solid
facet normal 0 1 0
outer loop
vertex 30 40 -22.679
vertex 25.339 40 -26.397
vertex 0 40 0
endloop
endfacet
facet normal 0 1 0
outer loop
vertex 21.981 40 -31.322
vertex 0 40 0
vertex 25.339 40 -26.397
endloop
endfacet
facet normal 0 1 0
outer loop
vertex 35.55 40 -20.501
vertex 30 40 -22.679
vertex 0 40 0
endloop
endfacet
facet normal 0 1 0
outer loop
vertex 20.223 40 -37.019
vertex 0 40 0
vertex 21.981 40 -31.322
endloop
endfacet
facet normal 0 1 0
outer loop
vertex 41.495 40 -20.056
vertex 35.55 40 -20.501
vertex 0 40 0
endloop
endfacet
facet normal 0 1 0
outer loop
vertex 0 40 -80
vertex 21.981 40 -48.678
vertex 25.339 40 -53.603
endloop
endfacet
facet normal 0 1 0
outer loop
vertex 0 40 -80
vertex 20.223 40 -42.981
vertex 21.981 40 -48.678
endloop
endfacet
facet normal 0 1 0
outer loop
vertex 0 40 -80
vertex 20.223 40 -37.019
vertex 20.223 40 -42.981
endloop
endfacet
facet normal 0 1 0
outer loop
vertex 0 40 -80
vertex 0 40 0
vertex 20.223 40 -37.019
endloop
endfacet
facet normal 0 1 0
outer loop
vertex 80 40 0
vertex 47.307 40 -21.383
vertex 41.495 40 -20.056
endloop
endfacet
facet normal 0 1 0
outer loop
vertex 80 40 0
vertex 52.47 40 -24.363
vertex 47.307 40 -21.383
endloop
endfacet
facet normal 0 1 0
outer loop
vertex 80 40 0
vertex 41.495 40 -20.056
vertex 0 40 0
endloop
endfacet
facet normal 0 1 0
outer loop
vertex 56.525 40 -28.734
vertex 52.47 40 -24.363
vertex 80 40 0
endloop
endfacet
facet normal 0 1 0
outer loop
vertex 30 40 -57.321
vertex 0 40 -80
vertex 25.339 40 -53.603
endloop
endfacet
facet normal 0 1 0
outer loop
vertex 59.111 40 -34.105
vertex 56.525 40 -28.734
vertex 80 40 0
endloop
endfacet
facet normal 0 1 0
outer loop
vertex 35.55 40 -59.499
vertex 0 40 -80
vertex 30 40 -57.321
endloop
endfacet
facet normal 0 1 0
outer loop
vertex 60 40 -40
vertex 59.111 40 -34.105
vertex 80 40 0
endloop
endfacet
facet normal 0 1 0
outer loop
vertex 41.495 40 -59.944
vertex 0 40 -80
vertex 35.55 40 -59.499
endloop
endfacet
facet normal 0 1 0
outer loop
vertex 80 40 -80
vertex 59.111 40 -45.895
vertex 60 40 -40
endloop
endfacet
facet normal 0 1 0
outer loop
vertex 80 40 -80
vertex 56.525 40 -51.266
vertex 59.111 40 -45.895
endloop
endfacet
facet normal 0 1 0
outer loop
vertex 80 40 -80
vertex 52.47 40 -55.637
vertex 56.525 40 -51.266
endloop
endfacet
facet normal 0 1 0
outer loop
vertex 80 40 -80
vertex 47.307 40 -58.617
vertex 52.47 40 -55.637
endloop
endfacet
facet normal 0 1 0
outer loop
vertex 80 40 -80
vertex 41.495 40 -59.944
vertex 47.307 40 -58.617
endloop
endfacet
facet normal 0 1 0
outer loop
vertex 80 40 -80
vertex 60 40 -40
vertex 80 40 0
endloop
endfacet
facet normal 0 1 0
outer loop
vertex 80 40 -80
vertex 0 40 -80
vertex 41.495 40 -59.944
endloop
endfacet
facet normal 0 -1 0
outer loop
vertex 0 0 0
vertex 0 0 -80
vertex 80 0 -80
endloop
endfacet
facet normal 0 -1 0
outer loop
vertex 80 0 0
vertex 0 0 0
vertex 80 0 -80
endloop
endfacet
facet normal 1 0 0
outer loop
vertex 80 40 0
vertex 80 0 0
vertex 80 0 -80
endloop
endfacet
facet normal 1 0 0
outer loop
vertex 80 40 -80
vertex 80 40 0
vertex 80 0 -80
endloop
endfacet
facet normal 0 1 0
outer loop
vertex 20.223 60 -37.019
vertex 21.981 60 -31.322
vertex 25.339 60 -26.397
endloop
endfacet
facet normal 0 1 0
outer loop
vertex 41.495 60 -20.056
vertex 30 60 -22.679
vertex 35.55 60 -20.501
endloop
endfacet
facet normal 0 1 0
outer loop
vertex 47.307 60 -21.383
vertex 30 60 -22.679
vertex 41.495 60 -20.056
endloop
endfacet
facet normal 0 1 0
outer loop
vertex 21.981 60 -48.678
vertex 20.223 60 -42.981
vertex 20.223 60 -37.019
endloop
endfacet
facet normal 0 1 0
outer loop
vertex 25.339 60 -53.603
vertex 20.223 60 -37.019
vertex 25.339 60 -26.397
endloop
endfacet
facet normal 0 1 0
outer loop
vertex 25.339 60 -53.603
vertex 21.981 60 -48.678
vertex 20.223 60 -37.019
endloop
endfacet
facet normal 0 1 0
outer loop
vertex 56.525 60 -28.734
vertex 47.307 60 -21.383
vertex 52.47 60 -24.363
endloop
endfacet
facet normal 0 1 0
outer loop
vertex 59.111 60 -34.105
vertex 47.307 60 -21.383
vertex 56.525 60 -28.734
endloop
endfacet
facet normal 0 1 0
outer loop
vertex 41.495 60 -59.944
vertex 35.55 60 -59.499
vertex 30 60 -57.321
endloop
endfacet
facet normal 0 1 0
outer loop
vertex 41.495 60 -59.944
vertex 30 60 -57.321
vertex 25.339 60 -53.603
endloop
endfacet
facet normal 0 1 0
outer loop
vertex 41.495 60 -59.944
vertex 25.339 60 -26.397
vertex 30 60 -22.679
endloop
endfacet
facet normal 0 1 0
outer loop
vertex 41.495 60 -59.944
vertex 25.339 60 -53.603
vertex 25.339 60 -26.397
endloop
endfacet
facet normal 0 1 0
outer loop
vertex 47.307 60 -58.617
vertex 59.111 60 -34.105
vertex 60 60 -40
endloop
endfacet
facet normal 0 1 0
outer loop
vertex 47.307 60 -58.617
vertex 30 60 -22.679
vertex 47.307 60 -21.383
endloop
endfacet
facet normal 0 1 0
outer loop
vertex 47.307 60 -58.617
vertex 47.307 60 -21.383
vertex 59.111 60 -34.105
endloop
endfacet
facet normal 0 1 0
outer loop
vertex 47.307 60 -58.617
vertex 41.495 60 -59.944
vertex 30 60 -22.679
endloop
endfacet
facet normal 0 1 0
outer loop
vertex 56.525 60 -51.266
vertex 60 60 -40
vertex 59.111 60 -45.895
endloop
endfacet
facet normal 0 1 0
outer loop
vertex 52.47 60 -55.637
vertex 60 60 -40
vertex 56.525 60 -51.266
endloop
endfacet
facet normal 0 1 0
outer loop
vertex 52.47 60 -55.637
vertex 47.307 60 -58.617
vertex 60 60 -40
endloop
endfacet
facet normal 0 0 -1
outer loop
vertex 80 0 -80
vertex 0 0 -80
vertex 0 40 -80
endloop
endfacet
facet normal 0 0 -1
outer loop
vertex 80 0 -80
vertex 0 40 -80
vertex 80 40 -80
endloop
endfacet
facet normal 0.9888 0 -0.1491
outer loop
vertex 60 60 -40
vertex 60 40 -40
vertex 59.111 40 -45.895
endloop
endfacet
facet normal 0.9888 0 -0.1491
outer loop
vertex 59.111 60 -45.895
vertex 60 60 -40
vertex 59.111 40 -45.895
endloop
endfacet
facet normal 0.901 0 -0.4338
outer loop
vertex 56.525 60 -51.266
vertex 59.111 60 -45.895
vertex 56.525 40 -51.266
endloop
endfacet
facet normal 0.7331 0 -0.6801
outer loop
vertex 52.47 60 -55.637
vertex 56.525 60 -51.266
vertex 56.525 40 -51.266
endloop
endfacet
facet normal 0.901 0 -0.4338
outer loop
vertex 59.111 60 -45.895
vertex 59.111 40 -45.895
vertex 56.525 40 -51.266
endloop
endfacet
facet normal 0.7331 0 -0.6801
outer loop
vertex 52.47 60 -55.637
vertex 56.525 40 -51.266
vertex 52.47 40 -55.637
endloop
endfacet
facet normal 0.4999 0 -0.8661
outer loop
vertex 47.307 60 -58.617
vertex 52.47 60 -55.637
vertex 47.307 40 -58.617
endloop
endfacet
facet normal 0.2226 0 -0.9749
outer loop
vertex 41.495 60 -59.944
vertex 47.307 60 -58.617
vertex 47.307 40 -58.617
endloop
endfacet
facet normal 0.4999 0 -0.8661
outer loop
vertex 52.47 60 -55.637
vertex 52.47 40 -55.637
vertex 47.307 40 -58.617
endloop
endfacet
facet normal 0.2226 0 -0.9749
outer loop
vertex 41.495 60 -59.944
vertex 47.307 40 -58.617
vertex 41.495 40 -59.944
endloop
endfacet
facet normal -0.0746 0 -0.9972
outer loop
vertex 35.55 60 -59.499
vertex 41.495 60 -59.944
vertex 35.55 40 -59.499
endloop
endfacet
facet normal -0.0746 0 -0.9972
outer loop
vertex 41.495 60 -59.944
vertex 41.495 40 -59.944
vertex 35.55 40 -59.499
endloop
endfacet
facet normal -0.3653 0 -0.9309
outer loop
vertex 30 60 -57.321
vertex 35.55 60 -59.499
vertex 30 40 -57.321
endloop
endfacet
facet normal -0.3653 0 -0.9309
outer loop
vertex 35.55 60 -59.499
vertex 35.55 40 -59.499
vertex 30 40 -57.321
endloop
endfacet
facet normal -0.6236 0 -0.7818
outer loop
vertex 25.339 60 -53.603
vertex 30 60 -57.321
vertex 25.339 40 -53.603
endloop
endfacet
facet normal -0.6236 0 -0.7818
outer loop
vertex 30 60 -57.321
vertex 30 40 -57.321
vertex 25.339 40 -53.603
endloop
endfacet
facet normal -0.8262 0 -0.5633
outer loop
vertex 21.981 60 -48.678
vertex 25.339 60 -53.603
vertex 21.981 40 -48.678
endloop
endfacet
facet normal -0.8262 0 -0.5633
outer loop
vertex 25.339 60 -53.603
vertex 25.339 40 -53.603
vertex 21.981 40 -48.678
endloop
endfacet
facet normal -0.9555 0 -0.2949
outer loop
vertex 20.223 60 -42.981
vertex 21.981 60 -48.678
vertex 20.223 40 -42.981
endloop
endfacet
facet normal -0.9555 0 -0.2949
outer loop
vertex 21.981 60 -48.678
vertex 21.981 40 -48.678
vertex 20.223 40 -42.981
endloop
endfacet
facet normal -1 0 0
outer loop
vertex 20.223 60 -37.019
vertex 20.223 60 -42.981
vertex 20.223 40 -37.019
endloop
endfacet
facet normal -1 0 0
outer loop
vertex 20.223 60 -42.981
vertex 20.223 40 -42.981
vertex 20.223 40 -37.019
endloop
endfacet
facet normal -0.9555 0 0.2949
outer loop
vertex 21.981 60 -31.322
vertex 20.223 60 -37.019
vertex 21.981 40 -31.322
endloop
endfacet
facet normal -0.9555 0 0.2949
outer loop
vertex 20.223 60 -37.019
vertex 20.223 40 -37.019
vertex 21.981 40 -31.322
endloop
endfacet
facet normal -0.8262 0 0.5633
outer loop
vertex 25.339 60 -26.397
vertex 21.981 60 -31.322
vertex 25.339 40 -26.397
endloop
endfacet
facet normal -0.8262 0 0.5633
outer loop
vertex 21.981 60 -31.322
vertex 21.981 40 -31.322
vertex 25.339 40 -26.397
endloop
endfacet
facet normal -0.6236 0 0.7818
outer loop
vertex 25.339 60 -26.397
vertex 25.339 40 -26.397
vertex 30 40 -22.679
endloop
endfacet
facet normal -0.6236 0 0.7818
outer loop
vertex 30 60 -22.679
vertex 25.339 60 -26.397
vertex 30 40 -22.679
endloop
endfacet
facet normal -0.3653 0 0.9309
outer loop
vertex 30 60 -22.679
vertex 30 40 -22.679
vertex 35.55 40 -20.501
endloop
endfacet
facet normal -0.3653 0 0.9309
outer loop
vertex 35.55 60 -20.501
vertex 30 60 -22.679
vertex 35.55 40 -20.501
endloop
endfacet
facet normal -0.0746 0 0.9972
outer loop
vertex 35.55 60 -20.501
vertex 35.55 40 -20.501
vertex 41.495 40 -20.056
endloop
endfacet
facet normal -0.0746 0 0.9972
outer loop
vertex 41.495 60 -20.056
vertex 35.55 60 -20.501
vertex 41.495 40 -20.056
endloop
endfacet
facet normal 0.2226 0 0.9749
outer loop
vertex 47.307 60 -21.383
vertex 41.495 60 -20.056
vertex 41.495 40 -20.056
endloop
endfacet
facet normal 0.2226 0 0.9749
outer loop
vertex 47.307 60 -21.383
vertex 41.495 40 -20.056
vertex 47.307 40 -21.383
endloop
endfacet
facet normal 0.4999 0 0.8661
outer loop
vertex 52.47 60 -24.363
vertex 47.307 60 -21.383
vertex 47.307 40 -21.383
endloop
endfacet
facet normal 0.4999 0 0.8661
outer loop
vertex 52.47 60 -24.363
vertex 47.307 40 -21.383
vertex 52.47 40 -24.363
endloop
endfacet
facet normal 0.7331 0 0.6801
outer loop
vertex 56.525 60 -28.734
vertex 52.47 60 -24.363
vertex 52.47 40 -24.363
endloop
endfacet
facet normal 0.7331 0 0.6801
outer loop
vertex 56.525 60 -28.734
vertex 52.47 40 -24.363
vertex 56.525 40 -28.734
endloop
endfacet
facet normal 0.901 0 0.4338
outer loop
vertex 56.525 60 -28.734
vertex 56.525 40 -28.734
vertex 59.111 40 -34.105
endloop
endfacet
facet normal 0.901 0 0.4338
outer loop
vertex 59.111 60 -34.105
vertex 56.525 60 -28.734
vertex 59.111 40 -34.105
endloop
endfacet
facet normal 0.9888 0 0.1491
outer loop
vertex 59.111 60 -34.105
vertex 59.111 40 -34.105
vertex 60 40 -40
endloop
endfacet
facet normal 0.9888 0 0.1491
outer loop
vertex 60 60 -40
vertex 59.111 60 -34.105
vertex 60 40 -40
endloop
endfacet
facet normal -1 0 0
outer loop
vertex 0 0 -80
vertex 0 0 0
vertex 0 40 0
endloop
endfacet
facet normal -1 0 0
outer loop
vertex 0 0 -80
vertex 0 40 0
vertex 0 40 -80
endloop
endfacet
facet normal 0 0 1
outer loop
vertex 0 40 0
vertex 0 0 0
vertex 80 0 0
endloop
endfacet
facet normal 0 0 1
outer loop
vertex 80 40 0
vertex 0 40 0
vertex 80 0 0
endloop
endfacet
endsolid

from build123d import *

# Parameters (mm, degrees)
SKETCH1_W           = 80
SKETCH1_H           = 80
SKETCH1_R           = 20
BOSS_EXTRUDE1_DEPTH = 40
SKETCH1_3_R         = 20
BOSS_EXTRUDE2_DEPTH = 60


with BuildPart() as part:
    # Sketch1 → Boss-Extrude1 (new body)
    with BuildSketch(Plane(origin=(0, 0, 0), x_dir=(1, 0, 0), z_dir=(0, 1, 0))):
        with Locations((40, 40)):
            Rectangle(SKETCH1_W, SKETCH1_H)
        with Locations((40, 40)):
            Circle(SKETCH1_R, mode=Mode.SUBTRACT)
    extrude(amount=BOSS_EXTRUDE1_DEPTH)

    # Sketch1<3> → Boss-Extrude2 (add)
    with BuildSketch(Plane(origin=(0, 0, 0), x_dir=(1, 0, 0), z_dir=(0, 1, 0))):
        with Locations((40, 40)):
            Circle(SKETCH1_3_R)
    extrude(amount=BOSS_EXTRUDE2_DEPTH)


solid = part.part
